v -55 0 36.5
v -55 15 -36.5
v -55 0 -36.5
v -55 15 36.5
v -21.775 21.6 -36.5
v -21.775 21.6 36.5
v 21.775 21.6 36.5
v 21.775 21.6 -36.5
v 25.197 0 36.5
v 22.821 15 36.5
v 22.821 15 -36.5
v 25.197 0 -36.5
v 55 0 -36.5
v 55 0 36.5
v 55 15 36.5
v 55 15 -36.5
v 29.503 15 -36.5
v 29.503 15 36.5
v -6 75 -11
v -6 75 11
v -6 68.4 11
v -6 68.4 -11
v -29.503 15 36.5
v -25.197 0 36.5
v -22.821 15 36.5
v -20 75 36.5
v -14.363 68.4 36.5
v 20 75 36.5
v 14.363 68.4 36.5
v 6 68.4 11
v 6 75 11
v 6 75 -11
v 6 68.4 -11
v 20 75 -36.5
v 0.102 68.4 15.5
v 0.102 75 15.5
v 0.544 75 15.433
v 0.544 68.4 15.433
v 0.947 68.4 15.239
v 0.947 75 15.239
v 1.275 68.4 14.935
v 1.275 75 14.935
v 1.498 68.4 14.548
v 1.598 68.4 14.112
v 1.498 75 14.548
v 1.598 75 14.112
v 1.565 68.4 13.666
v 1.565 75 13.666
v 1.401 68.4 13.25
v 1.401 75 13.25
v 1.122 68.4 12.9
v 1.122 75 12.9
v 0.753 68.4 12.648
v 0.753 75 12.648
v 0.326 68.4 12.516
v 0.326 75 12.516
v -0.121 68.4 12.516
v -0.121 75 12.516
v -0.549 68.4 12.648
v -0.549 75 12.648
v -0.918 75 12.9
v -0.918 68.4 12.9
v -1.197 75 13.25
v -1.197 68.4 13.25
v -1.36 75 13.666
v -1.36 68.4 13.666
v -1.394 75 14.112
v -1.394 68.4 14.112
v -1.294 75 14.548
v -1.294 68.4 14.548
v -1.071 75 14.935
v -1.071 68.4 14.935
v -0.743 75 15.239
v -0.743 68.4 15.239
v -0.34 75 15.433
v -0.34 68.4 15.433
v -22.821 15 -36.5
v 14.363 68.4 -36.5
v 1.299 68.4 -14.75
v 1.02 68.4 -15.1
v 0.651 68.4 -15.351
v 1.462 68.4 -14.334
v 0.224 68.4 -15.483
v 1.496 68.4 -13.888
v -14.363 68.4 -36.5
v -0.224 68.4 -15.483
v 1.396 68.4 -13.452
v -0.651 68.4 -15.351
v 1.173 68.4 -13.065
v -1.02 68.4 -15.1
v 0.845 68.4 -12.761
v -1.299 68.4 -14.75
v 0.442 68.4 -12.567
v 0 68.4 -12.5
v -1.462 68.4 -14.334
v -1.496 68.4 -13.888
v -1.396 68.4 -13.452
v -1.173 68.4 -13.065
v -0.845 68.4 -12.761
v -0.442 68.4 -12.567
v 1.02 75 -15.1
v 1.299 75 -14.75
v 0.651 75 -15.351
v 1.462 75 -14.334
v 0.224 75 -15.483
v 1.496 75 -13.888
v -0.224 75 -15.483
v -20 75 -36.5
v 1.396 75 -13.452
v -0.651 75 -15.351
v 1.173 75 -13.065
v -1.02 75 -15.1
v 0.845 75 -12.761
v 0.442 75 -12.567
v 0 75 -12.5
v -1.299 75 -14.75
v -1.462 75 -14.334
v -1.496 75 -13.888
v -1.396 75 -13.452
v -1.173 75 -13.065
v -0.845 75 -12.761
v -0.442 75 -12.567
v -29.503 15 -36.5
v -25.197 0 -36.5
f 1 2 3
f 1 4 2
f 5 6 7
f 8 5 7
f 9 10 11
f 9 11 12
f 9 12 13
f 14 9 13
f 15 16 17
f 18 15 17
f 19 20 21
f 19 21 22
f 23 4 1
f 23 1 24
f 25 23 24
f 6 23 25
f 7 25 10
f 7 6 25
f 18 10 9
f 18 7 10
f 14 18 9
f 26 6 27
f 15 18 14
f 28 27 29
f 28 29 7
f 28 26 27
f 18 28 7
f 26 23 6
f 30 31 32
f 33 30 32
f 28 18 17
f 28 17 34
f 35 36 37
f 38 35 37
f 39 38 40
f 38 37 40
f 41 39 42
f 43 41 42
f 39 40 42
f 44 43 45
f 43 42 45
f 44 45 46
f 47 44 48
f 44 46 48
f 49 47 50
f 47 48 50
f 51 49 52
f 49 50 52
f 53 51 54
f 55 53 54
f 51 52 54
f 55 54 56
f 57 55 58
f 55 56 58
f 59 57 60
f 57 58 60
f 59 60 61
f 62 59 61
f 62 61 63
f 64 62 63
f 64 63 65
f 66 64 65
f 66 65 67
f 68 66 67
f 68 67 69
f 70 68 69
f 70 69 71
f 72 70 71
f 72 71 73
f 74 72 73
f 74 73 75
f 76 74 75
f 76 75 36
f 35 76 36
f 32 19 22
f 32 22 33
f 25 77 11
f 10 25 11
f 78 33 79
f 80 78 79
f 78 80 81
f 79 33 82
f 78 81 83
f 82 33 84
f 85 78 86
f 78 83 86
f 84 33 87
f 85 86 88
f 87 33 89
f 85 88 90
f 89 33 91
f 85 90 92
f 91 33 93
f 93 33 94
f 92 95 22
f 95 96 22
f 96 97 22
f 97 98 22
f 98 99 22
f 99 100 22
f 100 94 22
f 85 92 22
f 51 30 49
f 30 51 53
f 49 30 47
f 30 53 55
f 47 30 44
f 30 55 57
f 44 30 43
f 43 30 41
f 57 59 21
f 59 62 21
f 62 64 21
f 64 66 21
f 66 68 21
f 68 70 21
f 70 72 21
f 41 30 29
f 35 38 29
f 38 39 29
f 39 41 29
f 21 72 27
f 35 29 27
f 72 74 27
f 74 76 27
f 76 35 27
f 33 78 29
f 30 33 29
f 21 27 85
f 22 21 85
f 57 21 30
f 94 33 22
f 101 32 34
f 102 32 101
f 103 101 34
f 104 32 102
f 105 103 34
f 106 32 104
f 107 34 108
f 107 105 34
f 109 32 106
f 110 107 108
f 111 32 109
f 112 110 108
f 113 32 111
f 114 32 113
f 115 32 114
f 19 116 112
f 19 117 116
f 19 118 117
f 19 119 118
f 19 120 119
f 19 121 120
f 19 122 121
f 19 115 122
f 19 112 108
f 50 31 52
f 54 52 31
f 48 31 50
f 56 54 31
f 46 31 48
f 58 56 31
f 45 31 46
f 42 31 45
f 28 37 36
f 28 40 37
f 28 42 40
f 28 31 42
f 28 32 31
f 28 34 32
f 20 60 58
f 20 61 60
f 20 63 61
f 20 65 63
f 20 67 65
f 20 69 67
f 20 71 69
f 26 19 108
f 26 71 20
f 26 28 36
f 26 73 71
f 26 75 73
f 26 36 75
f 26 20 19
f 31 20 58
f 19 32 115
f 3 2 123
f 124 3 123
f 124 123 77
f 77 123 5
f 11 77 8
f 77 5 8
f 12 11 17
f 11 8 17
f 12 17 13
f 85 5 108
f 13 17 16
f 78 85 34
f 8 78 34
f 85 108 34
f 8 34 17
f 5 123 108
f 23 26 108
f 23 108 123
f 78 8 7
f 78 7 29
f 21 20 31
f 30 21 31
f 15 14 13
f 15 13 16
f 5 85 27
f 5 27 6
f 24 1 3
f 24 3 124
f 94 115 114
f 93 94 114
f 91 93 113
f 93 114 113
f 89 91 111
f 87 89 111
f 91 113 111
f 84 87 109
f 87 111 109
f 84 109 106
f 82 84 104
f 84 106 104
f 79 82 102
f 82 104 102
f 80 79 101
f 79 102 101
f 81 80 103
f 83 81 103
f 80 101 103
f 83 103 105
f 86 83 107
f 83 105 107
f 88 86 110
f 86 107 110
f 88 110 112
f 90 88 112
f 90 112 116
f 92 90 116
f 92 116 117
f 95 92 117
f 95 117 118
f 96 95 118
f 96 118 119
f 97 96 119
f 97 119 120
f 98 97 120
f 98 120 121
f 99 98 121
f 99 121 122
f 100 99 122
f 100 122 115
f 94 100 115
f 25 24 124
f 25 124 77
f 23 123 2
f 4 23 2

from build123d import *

# Parameters (mm, degrees)
BOSS_EXTRUDE1_DEPTH = 36.5
CUT_EXTRUDE1_DEPTH  = 119.232821162
SKETCH3_W           = 12
SKETCH3_H           = 22
CUT_EXTRUDE4_DEPTH  = 7
SKETCH7_R           = 1.5
CUT_EXTRUDE10_DEPTH = 8


with BuildPart() as part:
    # Sketch1 → Boss-Extrude1 (new, symmetric)
    with BuildSketch(Plane.XY):
        Polygon((-55, 0), (55, 0), (55, 15), (29.503066419, 15), (20, 75), (-20, 75), (-29.503066419, 15), (-55, 15), align=None)
    extrude(amount=BOSS_EXTRUDE1_DEPTH, both=True)

    # Sketch2 → Cut-Extrude1 (cut, through all)
    with BuildSketch(Plane.XY.offset(36.5)):
        Polygon((-22.820796589, 15), (22.820796589, 15), (25.196563194, 0), (-25.196563194, 0), align=None)
        Polygon((-21.775459283, 21.6), (21.775459283, 21.6), (14.363067476, 68.4), (-14.363067476, 68.4), align=None)
    extrude(amount=-CUT_EXTRUDE1_DEPTH, mode=Mode.SUBTRACT)

    # Sketch3 → Cut-Extrude4 (cut)
    with BuildSketch(Plane(origin=(0, 75, 0), x_dir=(1, 0, 0), z_dir=(0, 1, 0))):
        Rectangle(SKETCH3_W, SKETCH3_H)
    extrude(amount=-CUT_EXTRUDE4_DEPTH, mode=Mode.SUBTRACT)

    # Sketch7 → Cut-Extrude10 (cut)
    with BuildSketch(Plane(origin=(0, 75, 0), x_dir=(1, 0, 0), z_dir=(0, 1, 0))):
        with Locations(Location((0, 14, 0), (0, 0, 270))):
            Circle(SKETCH7_R)
        with Locations(Location((0.102187059, -13.999627059, 0), (0, 0, 270))):
            Circle(SKETCH7_R)
    extrude(amount=-CUT_EXTRUDE10_DEPTH, mode=Mode.SUBTRACT)


solid = part.part
